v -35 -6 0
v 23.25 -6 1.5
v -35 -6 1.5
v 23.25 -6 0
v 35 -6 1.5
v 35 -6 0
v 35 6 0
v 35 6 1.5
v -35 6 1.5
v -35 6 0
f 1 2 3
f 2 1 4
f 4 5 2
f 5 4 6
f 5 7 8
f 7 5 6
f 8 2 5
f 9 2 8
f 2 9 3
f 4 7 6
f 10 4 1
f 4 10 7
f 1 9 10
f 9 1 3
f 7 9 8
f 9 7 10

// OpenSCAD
// 10-well agarose gel comb, printed lying flat
// Units: mm

$fn = 64;

// Plate / spine
plate_len   = 70;   // spine length (X)
plate_wid   = 12;   // spine width (Y)
plate_thk   = 1.5;  // plate thickness (Z)

// Teeth
tooth_count = 10;   // number of wells
tooth_w     = 5.0;  // tooth width (X)
tooth_l     = 12;   // tooth length (Y)
tooth_pitch = 1.5;  // centre-to-centre spacing (X)

// Cutting overlap
eps = 0.5;          // extension past cut faces

// Derived
row_len   = (tooth_count - 1) * tooth_pitch + tooth_w;  // row of teeth (X)
overhang  = plate_len / 2 - row_len / 2;                // centre offset (X)

difference() {
    // Base plate
    translate([-plate_len / 2, -plate_wid / 2, 0])
        cube([plate_len, plate_wid, plate_thk]);

    // Teeth, hanging in -Y, centred on spine
    for (i = [0 : tooth_count - 1]) {
        translate([overhang + i * tooth_pitch - tooth_w / 2,
                   -plate_wid / 2 - tooth_l,
                   0])
            cube([tooth_w, tooth_l, plate_thk + eps]);
    }
}
